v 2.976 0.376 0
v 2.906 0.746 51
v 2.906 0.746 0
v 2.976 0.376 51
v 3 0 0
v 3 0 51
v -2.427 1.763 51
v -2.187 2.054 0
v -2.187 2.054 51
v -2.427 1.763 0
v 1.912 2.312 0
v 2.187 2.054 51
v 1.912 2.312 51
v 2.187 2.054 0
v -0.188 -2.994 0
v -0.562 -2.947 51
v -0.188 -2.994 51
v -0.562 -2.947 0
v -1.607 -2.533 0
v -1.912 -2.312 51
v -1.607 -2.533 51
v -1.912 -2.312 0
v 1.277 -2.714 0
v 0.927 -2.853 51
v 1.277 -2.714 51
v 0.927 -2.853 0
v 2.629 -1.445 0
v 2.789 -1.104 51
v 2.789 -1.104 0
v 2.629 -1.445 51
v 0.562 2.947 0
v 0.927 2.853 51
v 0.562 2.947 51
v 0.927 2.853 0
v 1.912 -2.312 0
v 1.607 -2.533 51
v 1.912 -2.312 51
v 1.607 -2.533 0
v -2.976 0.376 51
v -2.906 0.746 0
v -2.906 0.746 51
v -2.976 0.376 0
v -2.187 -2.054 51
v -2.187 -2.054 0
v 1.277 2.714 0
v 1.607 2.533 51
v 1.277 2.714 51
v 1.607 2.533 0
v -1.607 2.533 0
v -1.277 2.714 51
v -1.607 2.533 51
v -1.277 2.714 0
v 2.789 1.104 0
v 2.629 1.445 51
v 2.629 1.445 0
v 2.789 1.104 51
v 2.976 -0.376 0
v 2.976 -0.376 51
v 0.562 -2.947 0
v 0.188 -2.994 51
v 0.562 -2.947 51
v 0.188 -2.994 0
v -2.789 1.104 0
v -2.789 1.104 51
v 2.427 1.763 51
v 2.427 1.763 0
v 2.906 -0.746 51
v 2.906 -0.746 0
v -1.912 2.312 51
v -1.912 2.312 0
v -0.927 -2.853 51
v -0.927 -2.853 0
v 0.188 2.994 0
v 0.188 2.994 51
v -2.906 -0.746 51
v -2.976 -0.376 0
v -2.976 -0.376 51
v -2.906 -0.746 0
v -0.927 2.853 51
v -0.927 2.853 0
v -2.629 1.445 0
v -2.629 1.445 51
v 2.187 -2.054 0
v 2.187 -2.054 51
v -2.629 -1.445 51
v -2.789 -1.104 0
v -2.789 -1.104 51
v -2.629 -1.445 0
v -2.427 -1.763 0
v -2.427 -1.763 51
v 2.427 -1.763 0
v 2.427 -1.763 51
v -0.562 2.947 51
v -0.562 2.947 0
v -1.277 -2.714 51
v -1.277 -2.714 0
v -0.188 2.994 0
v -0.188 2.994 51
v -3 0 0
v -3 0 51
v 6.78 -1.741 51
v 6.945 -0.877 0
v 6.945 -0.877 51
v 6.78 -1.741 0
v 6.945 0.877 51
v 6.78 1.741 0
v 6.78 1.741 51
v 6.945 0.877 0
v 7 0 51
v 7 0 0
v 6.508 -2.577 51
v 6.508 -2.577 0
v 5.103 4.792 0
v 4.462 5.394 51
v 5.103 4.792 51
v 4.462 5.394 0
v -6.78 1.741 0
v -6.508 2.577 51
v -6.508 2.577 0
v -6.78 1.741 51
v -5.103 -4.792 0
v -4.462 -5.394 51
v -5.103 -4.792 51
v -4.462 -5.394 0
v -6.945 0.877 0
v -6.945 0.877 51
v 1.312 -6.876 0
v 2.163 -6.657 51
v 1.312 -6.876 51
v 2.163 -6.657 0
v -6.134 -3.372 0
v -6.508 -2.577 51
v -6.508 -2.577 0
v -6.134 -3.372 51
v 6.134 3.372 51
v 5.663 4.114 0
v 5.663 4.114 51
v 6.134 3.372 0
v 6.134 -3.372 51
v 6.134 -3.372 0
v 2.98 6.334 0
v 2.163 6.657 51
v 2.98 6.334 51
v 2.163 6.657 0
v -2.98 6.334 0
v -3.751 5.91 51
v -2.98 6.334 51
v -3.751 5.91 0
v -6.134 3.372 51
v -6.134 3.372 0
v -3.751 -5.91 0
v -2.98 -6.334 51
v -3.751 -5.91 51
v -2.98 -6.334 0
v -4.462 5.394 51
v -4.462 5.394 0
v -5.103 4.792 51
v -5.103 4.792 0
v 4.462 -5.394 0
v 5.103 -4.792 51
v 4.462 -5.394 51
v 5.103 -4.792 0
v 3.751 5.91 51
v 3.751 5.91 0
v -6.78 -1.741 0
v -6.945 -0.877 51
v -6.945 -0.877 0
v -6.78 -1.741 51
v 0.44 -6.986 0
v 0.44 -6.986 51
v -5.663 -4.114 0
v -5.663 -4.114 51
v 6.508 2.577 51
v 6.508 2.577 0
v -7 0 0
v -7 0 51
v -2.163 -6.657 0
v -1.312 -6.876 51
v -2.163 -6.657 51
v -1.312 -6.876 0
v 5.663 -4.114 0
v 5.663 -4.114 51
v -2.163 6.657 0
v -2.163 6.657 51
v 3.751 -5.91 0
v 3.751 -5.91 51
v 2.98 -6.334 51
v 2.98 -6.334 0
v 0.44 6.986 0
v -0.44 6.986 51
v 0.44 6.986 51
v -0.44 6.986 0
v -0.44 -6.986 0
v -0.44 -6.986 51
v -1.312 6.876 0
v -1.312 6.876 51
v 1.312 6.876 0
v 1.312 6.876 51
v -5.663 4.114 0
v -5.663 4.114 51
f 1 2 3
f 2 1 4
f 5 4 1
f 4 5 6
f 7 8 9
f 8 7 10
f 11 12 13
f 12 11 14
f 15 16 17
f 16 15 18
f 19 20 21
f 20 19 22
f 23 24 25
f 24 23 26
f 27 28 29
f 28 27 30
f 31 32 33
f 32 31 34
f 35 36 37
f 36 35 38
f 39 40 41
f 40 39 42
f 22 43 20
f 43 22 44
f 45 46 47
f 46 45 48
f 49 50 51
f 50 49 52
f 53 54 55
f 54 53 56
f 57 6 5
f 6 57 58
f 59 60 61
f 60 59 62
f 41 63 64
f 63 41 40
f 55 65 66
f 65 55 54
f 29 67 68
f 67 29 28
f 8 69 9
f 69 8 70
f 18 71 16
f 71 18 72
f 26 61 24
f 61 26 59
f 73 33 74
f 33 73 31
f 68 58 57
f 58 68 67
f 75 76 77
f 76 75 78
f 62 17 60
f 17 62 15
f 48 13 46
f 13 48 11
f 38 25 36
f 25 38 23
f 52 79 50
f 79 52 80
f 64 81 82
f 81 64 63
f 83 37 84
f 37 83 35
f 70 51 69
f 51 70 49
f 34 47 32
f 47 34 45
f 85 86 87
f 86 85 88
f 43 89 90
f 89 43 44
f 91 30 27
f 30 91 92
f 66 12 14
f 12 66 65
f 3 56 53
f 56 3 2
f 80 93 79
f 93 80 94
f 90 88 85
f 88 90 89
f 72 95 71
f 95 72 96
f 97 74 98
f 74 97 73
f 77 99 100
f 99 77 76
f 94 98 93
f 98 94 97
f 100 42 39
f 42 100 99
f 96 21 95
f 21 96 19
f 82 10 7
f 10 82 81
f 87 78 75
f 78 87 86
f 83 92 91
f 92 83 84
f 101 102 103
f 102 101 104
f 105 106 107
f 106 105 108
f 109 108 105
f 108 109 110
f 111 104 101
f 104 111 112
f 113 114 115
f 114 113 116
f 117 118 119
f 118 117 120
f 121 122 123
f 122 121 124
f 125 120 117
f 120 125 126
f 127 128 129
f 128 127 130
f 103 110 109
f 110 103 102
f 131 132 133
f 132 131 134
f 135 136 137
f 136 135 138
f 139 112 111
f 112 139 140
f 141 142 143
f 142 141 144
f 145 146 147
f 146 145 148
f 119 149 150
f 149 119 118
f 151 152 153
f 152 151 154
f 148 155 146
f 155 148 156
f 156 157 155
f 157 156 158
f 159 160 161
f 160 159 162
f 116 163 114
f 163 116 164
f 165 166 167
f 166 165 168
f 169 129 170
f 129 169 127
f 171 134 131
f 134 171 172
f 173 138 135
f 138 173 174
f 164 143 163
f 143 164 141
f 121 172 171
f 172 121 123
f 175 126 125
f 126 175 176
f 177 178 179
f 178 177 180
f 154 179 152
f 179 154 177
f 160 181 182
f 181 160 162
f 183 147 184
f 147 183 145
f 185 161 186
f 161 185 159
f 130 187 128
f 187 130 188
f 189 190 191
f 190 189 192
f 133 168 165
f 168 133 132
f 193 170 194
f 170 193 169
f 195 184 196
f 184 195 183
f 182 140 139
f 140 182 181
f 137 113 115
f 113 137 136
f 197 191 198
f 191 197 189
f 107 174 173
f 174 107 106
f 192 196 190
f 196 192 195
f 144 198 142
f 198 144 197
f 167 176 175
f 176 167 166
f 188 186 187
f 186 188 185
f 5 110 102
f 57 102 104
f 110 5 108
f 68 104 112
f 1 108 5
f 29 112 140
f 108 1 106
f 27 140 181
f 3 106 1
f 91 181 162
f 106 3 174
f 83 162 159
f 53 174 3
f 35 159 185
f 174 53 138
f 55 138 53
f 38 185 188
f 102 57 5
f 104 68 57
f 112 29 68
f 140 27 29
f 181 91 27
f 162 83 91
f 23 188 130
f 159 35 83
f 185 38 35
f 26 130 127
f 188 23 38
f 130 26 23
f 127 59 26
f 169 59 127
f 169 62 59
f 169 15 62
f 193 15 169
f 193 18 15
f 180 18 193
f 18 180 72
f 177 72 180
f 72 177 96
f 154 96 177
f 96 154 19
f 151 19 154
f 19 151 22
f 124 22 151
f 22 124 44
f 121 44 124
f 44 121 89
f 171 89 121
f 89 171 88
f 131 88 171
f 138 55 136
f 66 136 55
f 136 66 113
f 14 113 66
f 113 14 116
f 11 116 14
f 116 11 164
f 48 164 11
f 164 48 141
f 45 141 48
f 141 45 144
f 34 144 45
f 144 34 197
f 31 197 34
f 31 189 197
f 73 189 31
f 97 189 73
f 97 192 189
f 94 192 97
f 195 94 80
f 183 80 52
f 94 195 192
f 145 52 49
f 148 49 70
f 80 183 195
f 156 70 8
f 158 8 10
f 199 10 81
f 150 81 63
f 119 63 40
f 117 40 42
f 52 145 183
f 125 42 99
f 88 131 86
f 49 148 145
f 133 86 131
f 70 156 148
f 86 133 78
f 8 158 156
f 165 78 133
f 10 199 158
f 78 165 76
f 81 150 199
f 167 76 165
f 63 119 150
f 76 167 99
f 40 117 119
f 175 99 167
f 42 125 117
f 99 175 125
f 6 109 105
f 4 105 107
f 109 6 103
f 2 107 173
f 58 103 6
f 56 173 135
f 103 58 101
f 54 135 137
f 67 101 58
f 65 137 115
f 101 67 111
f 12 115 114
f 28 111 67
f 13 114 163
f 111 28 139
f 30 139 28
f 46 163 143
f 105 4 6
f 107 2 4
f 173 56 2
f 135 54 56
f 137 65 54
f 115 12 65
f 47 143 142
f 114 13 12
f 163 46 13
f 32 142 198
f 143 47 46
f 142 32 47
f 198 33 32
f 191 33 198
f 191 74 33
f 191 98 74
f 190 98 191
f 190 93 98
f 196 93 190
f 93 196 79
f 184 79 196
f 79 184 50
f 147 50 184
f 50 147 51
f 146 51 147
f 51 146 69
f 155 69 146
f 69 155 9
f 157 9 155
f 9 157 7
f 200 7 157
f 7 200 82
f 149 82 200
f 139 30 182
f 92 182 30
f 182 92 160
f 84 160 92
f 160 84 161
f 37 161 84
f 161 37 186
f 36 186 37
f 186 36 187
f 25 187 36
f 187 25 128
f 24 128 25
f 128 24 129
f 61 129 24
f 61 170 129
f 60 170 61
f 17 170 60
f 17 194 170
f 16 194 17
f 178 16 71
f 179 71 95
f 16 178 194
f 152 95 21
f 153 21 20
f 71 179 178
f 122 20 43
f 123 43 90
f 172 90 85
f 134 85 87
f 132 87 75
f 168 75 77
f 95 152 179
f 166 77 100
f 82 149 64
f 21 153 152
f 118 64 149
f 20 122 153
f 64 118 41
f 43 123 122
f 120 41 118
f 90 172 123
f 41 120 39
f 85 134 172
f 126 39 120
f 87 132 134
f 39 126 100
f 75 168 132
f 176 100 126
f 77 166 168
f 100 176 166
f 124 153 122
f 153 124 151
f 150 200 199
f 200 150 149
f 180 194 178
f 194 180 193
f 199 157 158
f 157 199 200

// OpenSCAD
$fn = 50;


difference() {
	union() {
		cylinder(h = 51, r = 7.0000000000);
	}
	union() {
		translate(v = [0.0000000000, 0.0000000000, -100.0000000000]) {
			cylinder(h = 200, r = 3.0000000000);
		}
		cylinder(h = 51, r = 1.5000000000);
		cylinder(h = 51, r = 1.5000000000);
		cylinder(h = 51, r = 1.5000000000);
	}
}
